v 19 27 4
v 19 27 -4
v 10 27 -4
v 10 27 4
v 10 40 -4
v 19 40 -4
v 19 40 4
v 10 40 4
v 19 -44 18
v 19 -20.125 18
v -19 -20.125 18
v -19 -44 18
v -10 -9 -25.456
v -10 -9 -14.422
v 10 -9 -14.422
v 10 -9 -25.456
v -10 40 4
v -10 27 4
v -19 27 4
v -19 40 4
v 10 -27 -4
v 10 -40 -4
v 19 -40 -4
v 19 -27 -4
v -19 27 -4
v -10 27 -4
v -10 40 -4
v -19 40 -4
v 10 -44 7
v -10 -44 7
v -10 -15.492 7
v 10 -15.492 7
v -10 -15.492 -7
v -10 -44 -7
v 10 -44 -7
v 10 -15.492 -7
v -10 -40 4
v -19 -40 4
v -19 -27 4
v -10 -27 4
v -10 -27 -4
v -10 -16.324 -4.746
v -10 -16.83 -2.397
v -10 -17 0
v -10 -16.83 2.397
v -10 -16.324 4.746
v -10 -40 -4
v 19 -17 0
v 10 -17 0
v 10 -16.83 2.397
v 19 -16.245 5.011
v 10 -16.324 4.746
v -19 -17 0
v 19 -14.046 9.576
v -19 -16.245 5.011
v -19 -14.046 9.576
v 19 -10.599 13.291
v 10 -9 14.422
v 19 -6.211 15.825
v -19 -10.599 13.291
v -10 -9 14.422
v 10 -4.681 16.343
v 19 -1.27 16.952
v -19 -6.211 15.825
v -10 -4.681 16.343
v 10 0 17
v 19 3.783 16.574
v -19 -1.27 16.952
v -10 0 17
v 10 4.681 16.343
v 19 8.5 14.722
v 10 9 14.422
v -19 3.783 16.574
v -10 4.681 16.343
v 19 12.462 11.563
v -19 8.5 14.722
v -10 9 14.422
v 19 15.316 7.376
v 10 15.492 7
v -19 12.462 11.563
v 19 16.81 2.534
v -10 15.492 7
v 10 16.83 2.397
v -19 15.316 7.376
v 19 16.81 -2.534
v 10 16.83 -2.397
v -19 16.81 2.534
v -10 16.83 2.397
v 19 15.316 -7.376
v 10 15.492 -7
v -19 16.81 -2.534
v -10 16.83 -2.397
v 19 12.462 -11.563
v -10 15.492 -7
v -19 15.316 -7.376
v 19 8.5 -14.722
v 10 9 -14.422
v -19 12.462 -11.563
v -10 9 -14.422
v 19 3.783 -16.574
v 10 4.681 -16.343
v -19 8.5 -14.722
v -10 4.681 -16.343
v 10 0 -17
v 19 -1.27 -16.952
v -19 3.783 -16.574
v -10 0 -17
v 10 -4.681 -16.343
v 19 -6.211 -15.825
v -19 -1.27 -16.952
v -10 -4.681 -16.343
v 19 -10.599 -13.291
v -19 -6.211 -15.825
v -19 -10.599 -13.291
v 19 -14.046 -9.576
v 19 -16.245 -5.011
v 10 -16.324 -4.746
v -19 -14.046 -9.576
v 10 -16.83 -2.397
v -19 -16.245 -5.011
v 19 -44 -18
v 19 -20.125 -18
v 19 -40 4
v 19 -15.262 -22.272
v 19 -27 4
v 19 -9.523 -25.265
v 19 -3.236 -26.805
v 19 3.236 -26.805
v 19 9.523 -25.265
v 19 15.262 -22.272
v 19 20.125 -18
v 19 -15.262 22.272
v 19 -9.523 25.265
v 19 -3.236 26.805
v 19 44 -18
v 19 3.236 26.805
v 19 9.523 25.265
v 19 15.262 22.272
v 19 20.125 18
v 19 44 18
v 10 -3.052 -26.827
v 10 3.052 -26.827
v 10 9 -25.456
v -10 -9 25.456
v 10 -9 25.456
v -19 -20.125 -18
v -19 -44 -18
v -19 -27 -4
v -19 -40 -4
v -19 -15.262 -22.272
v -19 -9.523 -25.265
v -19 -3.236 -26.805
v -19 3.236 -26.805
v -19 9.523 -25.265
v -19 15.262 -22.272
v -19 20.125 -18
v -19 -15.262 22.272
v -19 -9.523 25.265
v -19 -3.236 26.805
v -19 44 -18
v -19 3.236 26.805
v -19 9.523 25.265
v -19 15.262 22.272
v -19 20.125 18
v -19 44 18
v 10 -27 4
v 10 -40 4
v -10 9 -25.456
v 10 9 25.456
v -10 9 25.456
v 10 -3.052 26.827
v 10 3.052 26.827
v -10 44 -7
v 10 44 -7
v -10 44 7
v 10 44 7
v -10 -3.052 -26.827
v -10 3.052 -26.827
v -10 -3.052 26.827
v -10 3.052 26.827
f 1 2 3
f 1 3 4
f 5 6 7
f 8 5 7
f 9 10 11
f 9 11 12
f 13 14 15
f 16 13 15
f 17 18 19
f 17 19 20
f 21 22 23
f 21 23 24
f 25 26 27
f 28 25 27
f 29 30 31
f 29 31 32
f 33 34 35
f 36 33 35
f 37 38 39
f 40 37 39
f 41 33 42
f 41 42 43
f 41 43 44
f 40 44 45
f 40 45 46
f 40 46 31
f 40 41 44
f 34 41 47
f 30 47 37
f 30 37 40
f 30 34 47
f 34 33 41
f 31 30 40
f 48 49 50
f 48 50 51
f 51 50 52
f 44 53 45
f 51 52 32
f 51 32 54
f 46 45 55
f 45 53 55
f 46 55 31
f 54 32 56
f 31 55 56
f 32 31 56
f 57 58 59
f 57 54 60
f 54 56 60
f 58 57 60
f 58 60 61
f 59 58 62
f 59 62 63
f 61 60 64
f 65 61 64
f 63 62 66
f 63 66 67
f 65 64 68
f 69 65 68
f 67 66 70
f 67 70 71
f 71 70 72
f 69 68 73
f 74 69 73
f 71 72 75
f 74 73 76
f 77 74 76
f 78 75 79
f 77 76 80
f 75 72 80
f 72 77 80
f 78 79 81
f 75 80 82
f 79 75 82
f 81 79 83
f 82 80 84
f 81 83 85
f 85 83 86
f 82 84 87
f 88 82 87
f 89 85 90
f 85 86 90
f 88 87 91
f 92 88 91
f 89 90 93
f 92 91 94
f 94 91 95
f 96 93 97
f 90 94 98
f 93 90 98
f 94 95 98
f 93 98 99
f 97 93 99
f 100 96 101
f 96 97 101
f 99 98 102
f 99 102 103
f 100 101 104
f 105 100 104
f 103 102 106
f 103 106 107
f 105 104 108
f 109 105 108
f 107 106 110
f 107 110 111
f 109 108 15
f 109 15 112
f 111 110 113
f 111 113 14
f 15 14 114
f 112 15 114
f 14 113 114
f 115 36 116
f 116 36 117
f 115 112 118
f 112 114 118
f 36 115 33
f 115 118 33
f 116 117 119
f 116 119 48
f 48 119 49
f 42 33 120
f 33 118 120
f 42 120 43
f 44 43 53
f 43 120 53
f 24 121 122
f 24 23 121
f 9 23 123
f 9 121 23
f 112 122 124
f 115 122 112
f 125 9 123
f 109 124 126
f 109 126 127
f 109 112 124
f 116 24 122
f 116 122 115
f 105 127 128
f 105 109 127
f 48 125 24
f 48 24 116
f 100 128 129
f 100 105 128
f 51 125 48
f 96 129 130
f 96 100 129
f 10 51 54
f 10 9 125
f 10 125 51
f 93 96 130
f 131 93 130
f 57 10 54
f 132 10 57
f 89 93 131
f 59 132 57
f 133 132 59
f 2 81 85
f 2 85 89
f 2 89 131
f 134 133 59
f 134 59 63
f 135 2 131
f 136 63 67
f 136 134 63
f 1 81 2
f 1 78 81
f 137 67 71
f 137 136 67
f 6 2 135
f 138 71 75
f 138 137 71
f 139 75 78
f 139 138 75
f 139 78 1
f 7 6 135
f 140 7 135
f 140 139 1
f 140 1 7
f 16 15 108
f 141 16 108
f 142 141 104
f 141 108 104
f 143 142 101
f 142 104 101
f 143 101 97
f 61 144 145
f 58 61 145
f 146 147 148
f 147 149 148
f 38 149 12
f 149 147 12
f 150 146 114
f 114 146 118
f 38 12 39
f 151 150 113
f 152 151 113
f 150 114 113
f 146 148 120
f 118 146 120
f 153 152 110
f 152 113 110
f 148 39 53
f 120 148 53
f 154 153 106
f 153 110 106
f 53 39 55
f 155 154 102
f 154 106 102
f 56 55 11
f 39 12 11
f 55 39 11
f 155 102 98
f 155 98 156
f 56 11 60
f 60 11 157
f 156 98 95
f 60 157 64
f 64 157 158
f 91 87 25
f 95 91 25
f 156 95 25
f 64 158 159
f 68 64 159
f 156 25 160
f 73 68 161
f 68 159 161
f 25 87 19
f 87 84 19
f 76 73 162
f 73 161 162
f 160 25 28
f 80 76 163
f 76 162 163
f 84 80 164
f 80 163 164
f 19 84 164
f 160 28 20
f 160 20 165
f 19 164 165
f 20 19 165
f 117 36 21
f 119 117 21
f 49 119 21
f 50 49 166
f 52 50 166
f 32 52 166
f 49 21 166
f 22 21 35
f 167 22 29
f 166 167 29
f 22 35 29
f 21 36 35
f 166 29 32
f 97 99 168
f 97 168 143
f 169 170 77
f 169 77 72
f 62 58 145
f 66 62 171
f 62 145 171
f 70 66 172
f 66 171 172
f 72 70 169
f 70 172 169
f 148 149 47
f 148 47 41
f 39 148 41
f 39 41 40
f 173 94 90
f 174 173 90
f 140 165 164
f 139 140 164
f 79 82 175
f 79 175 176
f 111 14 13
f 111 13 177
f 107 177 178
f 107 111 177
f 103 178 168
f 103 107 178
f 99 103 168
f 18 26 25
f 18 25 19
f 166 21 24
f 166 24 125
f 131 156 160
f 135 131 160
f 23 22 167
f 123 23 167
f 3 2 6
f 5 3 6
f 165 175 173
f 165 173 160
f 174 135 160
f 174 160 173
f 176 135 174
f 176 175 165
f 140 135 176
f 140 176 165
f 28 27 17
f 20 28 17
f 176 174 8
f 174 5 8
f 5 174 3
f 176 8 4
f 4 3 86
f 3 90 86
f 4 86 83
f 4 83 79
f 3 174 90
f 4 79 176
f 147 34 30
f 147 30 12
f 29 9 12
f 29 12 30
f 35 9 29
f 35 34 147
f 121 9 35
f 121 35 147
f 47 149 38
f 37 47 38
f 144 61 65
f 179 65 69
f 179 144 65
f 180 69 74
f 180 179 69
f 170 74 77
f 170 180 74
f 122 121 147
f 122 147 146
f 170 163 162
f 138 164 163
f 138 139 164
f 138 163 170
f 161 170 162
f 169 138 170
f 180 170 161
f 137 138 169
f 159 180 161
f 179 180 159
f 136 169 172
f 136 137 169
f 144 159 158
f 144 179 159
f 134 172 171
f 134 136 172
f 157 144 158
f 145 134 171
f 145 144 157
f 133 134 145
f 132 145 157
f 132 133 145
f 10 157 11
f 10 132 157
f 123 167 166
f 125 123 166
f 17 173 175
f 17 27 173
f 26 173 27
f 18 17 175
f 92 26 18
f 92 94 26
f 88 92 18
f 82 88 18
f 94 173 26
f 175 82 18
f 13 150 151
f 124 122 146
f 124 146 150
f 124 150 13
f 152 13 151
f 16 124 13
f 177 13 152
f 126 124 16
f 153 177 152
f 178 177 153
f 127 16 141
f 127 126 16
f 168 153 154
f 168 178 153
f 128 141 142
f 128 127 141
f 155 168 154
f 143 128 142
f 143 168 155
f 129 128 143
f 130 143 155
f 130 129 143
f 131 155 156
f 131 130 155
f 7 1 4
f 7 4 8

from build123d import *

# Parameters (mm, degrees)
F1_DEPTH = 19
F3_D     = 34
F4_W     = 20
F4_H     = 18
F5_DEPTH = 27
F6_W     = 13
F6_H     = 8
F7_DEPTH = 19
F8_W     = 20
F8_H     = 14
F9_DEPTH = 44


with BuildPart() as f1:
    # F0 (on Right) → F1 (new body, symmetric)
    with BuildSketch(Plane.YZ):
        with BuildLine():
            Line((-20.1246117975, 18), (20.1246117975, 18))
            ThreePointArc((20.1246117975, 18), (0, 27), (-20.1246117975, 18))
        make_face()
        with BuildLine():
            ThreePointArc((-20.1246117975, -18), (-27, 0), (-20.1246117975, 18))
            Line((-20.1246117975, 18), (-44, 18))
            Line((-44, 18), (-44, -18))
            Line((-44, -18), (-20.1246117975, -18))
        make_face()
        with BuildLine():
            ThreePointArc((20.1246117975, -18), (25.222653692, -9.6341964239), (27, 0))
            ThreePointArc((27, 0), (25.222653692, 9.6341964239), (20.1246117975, 18))
            Line((20.1246117975, 18), (-20.1246117975, 18))
            ThreePointArc((-20.1246117975, 18), (-27, 0), (-20.1246117975, -18))
            Line((-20.1246117975, -18), (20.1246117975, -18))
        make_face()
        with BuildLine():
            ThreePointArc((20.1246117975, 18), (25.222653692, 9.6341964239), (27, 0))
            ThreePointArc((27, 0), (25.222653692, -9.6341964239), (20.1246117975, -18))
            Line((20.1246117975, -18), (44, -18))
            Line((44, -18), (44, 18))
            Line((44, 18), (20.1246117975, 18))
        make_face()
        with BuildLine():
            ThreePointArc((-20.1246117975, -18), (0, -27), (20.1246117975, -18))
            Line((20.1246117975, -18), (-20.1246117975, -18))
        make_face()
    extrude(amount=F1_DEPTH, both=True)

    # F3 (through all)
    with Locations(Plane.YZ.offset(19)):
        with Locations((0, 0)):
            Hole(F3_D / 2)

    # F4 (on Top) → F5 (cut, symmetric)
    with BuildSketch(Plane.XY):
        Rectangle(F4_W, F4_H)
    extrude(amount=F5_DEPTH, both=True, mode=Mode.SUBTRACT)

    # F6 (on Right) → F7 (cut, symmetric)
    with BuildSketch(Plane.YZ):
        with Locations((-33.5, 0)):
            Rectangle(F6_W, F6_H)
        with Locations((33.5, 0)):
            Rectangle(F6_W, F6_H)
    extrude(amount=F7_DEPTH, both=True, mode=Mode.SUBTRACT)

    # F8 (on Front) → F9 (cut, symmetric)
    with BuildSketch(Plane.XZ):
        Rectangle(F8_W, F8_H)
    extrude(amount=F9_DEPTH, both=True, mode=Mode.SUBTRACT)


solid = f1.part
